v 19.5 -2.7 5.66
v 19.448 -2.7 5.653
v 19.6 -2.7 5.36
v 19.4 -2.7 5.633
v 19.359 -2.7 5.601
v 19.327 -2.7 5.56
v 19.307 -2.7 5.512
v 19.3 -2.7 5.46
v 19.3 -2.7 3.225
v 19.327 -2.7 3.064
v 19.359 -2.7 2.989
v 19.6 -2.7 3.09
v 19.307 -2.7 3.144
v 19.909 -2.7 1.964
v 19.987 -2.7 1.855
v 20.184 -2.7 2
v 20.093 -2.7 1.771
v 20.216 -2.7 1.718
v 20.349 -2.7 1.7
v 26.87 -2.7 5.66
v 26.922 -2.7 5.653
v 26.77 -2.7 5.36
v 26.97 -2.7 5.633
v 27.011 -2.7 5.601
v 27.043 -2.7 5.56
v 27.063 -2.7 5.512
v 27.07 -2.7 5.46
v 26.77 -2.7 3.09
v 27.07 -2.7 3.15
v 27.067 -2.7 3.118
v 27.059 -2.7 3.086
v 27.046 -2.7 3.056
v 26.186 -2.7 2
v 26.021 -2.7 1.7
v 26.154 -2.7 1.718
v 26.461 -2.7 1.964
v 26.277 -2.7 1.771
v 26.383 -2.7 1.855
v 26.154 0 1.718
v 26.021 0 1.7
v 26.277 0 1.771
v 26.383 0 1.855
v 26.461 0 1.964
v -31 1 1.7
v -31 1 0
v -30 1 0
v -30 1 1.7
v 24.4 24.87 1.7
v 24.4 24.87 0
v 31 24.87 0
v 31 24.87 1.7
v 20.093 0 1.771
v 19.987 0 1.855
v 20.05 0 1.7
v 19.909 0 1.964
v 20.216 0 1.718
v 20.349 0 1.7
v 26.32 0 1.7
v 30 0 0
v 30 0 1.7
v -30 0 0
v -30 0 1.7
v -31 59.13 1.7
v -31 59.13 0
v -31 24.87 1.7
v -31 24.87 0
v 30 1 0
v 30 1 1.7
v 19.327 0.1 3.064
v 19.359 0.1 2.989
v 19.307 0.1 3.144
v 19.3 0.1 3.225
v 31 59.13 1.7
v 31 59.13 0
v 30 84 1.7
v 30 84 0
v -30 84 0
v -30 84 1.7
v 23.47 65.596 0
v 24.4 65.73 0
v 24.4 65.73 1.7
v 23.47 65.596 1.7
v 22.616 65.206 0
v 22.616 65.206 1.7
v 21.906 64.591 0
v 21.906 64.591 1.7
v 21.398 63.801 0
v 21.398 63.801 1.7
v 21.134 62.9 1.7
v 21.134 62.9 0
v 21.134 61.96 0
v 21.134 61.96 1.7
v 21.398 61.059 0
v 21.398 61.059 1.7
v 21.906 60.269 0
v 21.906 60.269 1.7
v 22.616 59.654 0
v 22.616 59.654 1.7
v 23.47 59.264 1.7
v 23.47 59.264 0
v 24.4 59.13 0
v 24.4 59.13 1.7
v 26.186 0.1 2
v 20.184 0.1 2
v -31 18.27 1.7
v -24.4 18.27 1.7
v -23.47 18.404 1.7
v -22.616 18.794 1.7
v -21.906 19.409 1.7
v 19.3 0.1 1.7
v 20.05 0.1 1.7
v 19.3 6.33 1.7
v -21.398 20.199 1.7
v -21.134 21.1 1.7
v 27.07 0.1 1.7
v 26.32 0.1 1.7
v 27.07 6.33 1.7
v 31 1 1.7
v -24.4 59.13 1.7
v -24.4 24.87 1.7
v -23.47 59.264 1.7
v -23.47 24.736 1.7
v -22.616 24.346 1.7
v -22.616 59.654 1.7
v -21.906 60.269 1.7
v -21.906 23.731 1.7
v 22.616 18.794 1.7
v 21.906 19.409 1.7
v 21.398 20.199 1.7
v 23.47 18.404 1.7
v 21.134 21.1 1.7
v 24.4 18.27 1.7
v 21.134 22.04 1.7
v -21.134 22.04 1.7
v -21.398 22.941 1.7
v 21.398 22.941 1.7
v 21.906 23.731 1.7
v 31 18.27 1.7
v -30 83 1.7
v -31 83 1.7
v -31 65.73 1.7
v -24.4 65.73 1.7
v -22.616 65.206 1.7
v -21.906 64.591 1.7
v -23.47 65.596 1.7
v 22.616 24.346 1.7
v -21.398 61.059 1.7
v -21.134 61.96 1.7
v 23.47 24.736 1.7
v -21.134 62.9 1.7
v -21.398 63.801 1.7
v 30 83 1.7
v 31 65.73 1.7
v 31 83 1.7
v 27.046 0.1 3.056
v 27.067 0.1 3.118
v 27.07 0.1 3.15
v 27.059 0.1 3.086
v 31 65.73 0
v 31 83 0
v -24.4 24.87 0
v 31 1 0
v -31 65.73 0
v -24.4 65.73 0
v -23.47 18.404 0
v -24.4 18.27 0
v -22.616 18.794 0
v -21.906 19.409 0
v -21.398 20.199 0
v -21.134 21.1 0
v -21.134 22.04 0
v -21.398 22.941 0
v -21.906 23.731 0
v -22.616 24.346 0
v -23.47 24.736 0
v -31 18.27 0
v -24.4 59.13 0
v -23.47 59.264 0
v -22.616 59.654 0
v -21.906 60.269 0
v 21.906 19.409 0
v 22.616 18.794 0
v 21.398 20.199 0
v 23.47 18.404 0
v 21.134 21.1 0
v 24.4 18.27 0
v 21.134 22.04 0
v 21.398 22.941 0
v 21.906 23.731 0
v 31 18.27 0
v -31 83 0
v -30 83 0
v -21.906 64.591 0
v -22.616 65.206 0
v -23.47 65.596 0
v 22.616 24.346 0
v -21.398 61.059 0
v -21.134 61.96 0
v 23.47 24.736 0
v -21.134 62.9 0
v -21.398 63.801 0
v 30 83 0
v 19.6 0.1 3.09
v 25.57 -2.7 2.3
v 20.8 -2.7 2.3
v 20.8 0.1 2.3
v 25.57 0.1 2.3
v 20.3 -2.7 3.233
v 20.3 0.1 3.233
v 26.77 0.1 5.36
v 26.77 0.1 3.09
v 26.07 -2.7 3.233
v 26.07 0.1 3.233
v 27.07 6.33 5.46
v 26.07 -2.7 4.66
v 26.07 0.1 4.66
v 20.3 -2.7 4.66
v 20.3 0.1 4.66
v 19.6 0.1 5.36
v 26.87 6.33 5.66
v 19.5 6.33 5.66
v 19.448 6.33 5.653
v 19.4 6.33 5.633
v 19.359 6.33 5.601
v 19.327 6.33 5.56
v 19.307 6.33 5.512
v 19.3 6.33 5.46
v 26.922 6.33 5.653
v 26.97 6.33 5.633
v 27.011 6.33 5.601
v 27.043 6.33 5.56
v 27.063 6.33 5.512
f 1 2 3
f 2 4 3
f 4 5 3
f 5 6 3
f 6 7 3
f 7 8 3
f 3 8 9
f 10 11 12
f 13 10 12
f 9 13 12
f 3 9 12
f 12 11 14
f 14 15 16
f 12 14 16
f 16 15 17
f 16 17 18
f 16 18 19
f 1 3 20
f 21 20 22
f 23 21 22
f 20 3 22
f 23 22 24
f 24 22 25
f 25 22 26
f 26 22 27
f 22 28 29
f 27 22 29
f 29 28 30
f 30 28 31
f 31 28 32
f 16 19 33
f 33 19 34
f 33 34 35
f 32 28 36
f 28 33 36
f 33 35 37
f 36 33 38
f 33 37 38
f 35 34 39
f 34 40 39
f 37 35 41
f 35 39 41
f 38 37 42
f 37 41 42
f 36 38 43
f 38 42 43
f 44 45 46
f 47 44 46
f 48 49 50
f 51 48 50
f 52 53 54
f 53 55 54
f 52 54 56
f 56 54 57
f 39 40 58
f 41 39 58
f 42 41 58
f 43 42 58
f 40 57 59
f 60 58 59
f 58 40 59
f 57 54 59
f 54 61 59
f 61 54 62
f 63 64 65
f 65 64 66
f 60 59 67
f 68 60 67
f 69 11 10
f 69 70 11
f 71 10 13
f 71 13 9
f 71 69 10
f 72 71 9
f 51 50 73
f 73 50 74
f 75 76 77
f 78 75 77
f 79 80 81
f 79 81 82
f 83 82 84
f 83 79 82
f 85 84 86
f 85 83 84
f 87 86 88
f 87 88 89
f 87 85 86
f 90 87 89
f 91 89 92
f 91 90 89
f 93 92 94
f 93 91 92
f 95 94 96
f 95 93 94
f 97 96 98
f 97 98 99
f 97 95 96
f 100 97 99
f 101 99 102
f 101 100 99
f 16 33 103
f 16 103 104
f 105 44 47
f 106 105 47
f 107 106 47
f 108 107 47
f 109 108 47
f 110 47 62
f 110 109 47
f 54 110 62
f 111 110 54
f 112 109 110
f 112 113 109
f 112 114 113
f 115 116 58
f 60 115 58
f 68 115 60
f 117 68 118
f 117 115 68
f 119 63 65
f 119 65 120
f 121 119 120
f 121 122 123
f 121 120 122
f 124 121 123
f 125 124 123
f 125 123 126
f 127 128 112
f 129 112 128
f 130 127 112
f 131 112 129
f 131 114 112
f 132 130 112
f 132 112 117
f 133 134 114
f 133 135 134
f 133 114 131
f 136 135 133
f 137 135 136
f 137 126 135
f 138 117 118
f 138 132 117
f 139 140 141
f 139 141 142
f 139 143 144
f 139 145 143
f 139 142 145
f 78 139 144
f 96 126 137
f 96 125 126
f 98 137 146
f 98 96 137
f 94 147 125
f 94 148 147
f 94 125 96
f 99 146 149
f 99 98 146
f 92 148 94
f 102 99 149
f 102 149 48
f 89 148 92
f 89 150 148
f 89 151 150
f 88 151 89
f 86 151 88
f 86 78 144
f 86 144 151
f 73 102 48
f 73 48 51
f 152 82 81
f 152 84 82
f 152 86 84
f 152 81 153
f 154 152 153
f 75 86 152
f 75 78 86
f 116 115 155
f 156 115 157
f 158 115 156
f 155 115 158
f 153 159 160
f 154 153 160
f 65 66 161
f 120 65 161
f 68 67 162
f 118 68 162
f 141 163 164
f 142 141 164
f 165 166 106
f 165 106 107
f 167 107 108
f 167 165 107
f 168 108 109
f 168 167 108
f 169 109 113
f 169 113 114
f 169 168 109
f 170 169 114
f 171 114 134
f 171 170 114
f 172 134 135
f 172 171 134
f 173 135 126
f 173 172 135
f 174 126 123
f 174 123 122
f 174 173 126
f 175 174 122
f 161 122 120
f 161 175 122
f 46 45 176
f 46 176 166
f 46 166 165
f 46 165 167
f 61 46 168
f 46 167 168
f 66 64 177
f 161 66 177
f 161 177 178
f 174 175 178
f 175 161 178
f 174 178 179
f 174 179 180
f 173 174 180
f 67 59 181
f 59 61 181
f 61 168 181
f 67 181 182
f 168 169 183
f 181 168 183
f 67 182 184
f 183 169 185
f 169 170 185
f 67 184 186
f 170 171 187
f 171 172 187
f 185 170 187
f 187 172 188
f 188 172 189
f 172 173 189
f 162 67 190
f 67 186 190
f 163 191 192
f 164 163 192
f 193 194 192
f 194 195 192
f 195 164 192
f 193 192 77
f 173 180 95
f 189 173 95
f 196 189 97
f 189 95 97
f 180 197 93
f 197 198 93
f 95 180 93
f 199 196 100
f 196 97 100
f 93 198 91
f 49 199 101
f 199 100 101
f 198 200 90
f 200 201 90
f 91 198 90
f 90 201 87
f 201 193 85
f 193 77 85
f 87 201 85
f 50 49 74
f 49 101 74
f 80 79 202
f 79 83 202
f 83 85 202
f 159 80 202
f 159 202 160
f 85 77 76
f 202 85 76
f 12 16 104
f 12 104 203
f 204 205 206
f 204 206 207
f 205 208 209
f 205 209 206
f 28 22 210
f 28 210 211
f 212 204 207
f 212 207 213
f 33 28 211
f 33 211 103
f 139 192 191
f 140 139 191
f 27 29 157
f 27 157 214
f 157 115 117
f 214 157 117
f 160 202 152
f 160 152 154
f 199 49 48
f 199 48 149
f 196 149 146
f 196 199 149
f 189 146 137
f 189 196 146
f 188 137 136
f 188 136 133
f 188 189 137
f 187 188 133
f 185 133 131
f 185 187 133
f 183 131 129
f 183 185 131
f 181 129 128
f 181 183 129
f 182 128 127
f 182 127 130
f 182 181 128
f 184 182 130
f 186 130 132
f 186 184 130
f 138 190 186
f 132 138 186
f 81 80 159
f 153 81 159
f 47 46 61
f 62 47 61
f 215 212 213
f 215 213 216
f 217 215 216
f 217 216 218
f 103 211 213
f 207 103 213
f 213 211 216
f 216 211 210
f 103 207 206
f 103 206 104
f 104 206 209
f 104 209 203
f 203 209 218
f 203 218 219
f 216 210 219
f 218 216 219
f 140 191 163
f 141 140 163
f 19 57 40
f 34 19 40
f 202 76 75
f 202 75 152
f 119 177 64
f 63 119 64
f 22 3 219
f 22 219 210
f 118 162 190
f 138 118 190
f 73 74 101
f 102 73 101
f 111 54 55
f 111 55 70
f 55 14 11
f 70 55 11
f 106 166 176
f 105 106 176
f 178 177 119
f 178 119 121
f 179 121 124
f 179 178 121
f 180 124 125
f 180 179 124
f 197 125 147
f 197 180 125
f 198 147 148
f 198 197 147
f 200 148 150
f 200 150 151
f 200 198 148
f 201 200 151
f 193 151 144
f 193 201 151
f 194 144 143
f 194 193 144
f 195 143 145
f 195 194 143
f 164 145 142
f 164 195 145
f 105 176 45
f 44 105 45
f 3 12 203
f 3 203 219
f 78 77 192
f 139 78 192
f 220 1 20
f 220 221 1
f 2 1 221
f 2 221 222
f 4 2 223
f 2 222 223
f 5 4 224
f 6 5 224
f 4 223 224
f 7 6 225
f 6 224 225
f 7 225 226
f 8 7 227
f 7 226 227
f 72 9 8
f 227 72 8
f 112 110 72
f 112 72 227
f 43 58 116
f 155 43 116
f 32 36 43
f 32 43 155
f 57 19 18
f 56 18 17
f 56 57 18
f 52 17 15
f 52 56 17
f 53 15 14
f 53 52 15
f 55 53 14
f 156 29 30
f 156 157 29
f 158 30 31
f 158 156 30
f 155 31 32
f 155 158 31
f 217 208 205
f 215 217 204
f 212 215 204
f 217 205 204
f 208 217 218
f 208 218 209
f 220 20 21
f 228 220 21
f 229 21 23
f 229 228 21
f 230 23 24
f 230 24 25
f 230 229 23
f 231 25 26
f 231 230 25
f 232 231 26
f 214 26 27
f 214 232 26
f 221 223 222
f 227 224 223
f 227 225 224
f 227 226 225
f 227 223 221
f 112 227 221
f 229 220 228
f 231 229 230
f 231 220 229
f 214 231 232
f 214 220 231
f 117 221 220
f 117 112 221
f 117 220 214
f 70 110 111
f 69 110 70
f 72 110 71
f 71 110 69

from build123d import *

# Parameters (mm, degrees)
PAD_DEPTH    = 1.7
SKETCH005_W  = 7.77
SKETCH005_H  = 9.03
PAD006_DEPTH = 3.96
POCKET_DEPTH = 2.8
FILLET_R     = 0.2
FILLET001_R  = 0.2
FILLET007_R  = 0.2
FILLET008_R  = 0.5
FILLET009_R  = 0.5


with BuildPart() as part:
    # Sketch → Pad (new body)
    with BuildSketch(Plane.XY):
        with BuildLine():
            Line((0, 0), (30, 0))
            Line((30, 0), (30, 1))
            Line((30, 1), (31, 1))
            Line((31, 1), (31, 18.27))
            Line((31, 18.27), (24.4, 18.27))
            ThreePointArc((24.4, 24.87), (21.1, 21.57), (24.4, 18.27))
            Line((24.4, 24.87), (31, 24.87))
            Line((31, 24.87), (31, 59.13))
            Line((31, 59.13), (24.4, 59.13))
            ThreePointArc((24.4, 65.73), (21.1, 62.43), (24.4, 59.13))
            Line((24.4, 65.73), (31, 65.73))
            Line((31, 65.73), (31, 83))
            Line((30, 83), (31, 83))
            Line((30, 84), (30, 83))
            Line((30, 84), (0, 84))
            Line((0, 84), (-30, 84))
            Line((-30, 84), (-30, 83))
            Line((-30, 83), (-31, 83))
            Line((-31, 83), (-31, 65.73))
            Line((-31, 65.73), (-24.4, 65.73))
            ThreePointArc((-24.4, 59.13), (-21.1, 62.43), (-24.4, 65.73))
            Line((-24.4, 59.13), (-31, 59.13))
            Line((-31, 59.13), (-31, 24.87))
            Line((-31, 24.87), (-24.4, 24.87))
            ThreePointArc((-24.4, 18.27), (-21.1, 21.57), (-24.4, 24.87))
            Line((-24.4, 18.27), (-31, 18.27))
            Line((-31, 18.27), (-31, 1))
            Line((-31, 1), (-30, 1))
            Line((-30, 1), (-30, 0))
            Line((-30, 0), (0, 0))
        make_face()
    extrude(amount=PAD_DEPTH)

    # Sketch005 → Pad006 (new body)
    with BuildSketch(Plane.XY.offset(1.7)):
        with Locations((23.185, 1.815)):
            Rectangle(SKETCH005_W, SKETCH005_H)
    extrude(amount=PAD006_DEPTH)

    # Sketch011 → Pocket (cut)
    with BuildSketch(Plane.XZ.offset(2.7)):
        Polygon((19.3, 3.1), (19.3, 1.7), (20.05, 1.7), align=None)
        Polygon((27.07, 3.1), (27.07, 1.7), (26.32, 1.7), align=None)
        Polygon((19.6, 5.36), (26.77, 5.36), (26.77, 3.09), (26.186071, 2), (20.183929, 2), (19.6, 3.09), align=None)
        Polygon((20.3, 4.66), (20.3, 3.233333), (20.8, 2.3), (25.57, 2.3), (26.07, 3.233333), (26.07, 4.66), align=None, mode=Mode.SUBTRACT)
    extrude(amount=-POCKET_DEPTH, mode=Mode.SUBTRACT)

    # Fillet
    fillet_edges = [part.edges().sort_by_distance(p)[0] for p in [
        (27.07, 1.815, 5.66),
    ]]
    fillet(fillet_edges, radius=FILLET_R)

    # Fillet001
    fillet001_edges = [part.edges().sort_by_distance(p)[0] for p in [
        (19.3, 1.815, 5.66),
    ]]
    fillet(fillet001_edges, radius=FILLET001_R)

    # Fillet007
    fillet007_edges = [part.edges().sort_by_distance(p)[0] for p in [
        (27.07, -1.3, 3.1),
    ]]
    fillet(fillet007_edges, radius=FILLET007_R)

    # Fillet008
    fillet008_edges = [part.edges().sort_by_distance(p)[0] for p in [
        (26.32, -1.35, 1.7),
    ]]
    fillet(fillet008_edges, radius=FILLET008_R)

    # Fillet009
    fillet009_edges = [part.edges().sort_by_distance(p)[0] for p in [
        (19.3, -1.3, 3.1),
        (20.05, -1.35, 1.7),
    ]]
    fillet(fillet009_edges, radius=FILLET009_R)


solid = part.part
